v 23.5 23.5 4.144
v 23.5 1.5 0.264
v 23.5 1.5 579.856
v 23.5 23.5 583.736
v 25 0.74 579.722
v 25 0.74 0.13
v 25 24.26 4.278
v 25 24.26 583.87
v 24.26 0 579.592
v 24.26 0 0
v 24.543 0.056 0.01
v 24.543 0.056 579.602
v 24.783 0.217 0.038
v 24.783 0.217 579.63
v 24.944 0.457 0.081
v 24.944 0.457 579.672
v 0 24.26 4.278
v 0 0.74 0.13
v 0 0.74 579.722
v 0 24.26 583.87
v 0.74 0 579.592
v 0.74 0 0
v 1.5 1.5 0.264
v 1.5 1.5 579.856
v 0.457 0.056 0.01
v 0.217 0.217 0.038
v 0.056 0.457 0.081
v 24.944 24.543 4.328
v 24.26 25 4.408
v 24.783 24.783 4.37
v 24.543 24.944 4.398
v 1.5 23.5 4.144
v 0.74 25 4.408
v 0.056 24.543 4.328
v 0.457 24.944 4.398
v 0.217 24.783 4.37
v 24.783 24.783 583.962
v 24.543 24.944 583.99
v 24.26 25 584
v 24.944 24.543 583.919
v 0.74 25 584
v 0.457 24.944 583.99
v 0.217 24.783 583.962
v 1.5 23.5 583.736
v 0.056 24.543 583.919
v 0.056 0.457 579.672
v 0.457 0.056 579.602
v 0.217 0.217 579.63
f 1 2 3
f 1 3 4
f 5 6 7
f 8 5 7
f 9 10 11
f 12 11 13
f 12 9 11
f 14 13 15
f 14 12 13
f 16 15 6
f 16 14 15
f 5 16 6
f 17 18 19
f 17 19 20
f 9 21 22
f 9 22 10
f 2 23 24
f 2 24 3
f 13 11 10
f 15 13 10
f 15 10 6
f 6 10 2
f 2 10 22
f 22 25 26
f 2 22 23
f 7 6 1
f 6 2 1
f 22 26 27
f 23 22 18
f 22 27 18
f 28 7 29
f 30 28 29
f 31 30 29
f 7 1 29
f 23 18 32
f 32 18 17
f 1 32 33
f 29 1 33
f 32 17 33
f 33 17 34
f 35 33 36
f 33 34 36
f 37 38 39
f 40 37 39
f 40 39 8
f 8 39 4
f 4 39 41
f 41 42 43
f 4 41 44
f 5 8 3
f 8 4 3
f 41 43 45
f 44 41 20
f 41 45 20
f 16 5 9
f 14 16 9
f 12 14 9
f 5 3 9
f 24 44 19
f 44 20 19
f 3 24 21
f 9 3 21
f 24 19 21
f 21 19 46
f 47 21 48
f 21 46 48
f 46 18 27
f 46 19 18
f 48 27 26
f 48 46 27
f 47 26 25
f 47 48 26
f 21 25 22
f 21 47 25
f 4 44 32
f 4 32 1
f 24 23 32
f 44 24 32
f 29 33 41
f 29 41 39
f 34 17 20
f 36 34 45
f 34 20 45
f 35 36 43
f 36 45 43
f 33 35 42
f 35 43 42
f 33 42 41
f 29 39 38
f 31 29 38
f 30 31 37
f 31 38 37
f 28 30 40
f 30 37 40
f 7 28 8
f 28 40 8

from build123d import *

# Parameters (mm, degrees)
SKETCH_W     = 25
SKETCH_H     = 25
SKETCH_W_2   = 22
SKETCH_H_2   = 22
PAD_DEPTH    = 584
FILLET_R     = 0.74
POCKET_DEPTH = 25.001


with BuildPart() as part:
    # Sketch → Pad (new body)
    with BuildSketch(Plane.XY):
        with Locations((12.5, 12.5)):
            Rectangle(SKETCH_W, SKETCH_H)
        with Locations((12.5, 12.5)):
            Rectangle(SKETCH_W_2, SKETCH_H_2, mode=Mode.SUBTRACT)
    extrude(amount=PAD_DEPTH)

    # Fillet
    fillet_edges = [part.edges().sort_by_distance(p)[0] for p in [
        (25, 0, 292),
        (0, 0, 292),
        (25, 25, 292),
        (0, 25, 292),
    ]]
    fillet(fillet_edges, radius=FILLET_R)

    # Sketch001 (on Face6 of Fillet) → Pocket (cut, through all)
    with BuildSketch(Plane(origin=(0, 0, 0), x_dir=(0, -1, 0), z_dir=(-1, 0, 0))):
        Polygon((0, 0), (-42.305785, 7.459651), (-25.0585, -14.483582), align=None)
        Polygon((-25, 584), (31.802426, 573.9842), (24.213916, 600.392365), align=None)
    extrude(amount=-POCKET_DEPTH, mode=Mode.SUBTRACT)


solid = part.part
